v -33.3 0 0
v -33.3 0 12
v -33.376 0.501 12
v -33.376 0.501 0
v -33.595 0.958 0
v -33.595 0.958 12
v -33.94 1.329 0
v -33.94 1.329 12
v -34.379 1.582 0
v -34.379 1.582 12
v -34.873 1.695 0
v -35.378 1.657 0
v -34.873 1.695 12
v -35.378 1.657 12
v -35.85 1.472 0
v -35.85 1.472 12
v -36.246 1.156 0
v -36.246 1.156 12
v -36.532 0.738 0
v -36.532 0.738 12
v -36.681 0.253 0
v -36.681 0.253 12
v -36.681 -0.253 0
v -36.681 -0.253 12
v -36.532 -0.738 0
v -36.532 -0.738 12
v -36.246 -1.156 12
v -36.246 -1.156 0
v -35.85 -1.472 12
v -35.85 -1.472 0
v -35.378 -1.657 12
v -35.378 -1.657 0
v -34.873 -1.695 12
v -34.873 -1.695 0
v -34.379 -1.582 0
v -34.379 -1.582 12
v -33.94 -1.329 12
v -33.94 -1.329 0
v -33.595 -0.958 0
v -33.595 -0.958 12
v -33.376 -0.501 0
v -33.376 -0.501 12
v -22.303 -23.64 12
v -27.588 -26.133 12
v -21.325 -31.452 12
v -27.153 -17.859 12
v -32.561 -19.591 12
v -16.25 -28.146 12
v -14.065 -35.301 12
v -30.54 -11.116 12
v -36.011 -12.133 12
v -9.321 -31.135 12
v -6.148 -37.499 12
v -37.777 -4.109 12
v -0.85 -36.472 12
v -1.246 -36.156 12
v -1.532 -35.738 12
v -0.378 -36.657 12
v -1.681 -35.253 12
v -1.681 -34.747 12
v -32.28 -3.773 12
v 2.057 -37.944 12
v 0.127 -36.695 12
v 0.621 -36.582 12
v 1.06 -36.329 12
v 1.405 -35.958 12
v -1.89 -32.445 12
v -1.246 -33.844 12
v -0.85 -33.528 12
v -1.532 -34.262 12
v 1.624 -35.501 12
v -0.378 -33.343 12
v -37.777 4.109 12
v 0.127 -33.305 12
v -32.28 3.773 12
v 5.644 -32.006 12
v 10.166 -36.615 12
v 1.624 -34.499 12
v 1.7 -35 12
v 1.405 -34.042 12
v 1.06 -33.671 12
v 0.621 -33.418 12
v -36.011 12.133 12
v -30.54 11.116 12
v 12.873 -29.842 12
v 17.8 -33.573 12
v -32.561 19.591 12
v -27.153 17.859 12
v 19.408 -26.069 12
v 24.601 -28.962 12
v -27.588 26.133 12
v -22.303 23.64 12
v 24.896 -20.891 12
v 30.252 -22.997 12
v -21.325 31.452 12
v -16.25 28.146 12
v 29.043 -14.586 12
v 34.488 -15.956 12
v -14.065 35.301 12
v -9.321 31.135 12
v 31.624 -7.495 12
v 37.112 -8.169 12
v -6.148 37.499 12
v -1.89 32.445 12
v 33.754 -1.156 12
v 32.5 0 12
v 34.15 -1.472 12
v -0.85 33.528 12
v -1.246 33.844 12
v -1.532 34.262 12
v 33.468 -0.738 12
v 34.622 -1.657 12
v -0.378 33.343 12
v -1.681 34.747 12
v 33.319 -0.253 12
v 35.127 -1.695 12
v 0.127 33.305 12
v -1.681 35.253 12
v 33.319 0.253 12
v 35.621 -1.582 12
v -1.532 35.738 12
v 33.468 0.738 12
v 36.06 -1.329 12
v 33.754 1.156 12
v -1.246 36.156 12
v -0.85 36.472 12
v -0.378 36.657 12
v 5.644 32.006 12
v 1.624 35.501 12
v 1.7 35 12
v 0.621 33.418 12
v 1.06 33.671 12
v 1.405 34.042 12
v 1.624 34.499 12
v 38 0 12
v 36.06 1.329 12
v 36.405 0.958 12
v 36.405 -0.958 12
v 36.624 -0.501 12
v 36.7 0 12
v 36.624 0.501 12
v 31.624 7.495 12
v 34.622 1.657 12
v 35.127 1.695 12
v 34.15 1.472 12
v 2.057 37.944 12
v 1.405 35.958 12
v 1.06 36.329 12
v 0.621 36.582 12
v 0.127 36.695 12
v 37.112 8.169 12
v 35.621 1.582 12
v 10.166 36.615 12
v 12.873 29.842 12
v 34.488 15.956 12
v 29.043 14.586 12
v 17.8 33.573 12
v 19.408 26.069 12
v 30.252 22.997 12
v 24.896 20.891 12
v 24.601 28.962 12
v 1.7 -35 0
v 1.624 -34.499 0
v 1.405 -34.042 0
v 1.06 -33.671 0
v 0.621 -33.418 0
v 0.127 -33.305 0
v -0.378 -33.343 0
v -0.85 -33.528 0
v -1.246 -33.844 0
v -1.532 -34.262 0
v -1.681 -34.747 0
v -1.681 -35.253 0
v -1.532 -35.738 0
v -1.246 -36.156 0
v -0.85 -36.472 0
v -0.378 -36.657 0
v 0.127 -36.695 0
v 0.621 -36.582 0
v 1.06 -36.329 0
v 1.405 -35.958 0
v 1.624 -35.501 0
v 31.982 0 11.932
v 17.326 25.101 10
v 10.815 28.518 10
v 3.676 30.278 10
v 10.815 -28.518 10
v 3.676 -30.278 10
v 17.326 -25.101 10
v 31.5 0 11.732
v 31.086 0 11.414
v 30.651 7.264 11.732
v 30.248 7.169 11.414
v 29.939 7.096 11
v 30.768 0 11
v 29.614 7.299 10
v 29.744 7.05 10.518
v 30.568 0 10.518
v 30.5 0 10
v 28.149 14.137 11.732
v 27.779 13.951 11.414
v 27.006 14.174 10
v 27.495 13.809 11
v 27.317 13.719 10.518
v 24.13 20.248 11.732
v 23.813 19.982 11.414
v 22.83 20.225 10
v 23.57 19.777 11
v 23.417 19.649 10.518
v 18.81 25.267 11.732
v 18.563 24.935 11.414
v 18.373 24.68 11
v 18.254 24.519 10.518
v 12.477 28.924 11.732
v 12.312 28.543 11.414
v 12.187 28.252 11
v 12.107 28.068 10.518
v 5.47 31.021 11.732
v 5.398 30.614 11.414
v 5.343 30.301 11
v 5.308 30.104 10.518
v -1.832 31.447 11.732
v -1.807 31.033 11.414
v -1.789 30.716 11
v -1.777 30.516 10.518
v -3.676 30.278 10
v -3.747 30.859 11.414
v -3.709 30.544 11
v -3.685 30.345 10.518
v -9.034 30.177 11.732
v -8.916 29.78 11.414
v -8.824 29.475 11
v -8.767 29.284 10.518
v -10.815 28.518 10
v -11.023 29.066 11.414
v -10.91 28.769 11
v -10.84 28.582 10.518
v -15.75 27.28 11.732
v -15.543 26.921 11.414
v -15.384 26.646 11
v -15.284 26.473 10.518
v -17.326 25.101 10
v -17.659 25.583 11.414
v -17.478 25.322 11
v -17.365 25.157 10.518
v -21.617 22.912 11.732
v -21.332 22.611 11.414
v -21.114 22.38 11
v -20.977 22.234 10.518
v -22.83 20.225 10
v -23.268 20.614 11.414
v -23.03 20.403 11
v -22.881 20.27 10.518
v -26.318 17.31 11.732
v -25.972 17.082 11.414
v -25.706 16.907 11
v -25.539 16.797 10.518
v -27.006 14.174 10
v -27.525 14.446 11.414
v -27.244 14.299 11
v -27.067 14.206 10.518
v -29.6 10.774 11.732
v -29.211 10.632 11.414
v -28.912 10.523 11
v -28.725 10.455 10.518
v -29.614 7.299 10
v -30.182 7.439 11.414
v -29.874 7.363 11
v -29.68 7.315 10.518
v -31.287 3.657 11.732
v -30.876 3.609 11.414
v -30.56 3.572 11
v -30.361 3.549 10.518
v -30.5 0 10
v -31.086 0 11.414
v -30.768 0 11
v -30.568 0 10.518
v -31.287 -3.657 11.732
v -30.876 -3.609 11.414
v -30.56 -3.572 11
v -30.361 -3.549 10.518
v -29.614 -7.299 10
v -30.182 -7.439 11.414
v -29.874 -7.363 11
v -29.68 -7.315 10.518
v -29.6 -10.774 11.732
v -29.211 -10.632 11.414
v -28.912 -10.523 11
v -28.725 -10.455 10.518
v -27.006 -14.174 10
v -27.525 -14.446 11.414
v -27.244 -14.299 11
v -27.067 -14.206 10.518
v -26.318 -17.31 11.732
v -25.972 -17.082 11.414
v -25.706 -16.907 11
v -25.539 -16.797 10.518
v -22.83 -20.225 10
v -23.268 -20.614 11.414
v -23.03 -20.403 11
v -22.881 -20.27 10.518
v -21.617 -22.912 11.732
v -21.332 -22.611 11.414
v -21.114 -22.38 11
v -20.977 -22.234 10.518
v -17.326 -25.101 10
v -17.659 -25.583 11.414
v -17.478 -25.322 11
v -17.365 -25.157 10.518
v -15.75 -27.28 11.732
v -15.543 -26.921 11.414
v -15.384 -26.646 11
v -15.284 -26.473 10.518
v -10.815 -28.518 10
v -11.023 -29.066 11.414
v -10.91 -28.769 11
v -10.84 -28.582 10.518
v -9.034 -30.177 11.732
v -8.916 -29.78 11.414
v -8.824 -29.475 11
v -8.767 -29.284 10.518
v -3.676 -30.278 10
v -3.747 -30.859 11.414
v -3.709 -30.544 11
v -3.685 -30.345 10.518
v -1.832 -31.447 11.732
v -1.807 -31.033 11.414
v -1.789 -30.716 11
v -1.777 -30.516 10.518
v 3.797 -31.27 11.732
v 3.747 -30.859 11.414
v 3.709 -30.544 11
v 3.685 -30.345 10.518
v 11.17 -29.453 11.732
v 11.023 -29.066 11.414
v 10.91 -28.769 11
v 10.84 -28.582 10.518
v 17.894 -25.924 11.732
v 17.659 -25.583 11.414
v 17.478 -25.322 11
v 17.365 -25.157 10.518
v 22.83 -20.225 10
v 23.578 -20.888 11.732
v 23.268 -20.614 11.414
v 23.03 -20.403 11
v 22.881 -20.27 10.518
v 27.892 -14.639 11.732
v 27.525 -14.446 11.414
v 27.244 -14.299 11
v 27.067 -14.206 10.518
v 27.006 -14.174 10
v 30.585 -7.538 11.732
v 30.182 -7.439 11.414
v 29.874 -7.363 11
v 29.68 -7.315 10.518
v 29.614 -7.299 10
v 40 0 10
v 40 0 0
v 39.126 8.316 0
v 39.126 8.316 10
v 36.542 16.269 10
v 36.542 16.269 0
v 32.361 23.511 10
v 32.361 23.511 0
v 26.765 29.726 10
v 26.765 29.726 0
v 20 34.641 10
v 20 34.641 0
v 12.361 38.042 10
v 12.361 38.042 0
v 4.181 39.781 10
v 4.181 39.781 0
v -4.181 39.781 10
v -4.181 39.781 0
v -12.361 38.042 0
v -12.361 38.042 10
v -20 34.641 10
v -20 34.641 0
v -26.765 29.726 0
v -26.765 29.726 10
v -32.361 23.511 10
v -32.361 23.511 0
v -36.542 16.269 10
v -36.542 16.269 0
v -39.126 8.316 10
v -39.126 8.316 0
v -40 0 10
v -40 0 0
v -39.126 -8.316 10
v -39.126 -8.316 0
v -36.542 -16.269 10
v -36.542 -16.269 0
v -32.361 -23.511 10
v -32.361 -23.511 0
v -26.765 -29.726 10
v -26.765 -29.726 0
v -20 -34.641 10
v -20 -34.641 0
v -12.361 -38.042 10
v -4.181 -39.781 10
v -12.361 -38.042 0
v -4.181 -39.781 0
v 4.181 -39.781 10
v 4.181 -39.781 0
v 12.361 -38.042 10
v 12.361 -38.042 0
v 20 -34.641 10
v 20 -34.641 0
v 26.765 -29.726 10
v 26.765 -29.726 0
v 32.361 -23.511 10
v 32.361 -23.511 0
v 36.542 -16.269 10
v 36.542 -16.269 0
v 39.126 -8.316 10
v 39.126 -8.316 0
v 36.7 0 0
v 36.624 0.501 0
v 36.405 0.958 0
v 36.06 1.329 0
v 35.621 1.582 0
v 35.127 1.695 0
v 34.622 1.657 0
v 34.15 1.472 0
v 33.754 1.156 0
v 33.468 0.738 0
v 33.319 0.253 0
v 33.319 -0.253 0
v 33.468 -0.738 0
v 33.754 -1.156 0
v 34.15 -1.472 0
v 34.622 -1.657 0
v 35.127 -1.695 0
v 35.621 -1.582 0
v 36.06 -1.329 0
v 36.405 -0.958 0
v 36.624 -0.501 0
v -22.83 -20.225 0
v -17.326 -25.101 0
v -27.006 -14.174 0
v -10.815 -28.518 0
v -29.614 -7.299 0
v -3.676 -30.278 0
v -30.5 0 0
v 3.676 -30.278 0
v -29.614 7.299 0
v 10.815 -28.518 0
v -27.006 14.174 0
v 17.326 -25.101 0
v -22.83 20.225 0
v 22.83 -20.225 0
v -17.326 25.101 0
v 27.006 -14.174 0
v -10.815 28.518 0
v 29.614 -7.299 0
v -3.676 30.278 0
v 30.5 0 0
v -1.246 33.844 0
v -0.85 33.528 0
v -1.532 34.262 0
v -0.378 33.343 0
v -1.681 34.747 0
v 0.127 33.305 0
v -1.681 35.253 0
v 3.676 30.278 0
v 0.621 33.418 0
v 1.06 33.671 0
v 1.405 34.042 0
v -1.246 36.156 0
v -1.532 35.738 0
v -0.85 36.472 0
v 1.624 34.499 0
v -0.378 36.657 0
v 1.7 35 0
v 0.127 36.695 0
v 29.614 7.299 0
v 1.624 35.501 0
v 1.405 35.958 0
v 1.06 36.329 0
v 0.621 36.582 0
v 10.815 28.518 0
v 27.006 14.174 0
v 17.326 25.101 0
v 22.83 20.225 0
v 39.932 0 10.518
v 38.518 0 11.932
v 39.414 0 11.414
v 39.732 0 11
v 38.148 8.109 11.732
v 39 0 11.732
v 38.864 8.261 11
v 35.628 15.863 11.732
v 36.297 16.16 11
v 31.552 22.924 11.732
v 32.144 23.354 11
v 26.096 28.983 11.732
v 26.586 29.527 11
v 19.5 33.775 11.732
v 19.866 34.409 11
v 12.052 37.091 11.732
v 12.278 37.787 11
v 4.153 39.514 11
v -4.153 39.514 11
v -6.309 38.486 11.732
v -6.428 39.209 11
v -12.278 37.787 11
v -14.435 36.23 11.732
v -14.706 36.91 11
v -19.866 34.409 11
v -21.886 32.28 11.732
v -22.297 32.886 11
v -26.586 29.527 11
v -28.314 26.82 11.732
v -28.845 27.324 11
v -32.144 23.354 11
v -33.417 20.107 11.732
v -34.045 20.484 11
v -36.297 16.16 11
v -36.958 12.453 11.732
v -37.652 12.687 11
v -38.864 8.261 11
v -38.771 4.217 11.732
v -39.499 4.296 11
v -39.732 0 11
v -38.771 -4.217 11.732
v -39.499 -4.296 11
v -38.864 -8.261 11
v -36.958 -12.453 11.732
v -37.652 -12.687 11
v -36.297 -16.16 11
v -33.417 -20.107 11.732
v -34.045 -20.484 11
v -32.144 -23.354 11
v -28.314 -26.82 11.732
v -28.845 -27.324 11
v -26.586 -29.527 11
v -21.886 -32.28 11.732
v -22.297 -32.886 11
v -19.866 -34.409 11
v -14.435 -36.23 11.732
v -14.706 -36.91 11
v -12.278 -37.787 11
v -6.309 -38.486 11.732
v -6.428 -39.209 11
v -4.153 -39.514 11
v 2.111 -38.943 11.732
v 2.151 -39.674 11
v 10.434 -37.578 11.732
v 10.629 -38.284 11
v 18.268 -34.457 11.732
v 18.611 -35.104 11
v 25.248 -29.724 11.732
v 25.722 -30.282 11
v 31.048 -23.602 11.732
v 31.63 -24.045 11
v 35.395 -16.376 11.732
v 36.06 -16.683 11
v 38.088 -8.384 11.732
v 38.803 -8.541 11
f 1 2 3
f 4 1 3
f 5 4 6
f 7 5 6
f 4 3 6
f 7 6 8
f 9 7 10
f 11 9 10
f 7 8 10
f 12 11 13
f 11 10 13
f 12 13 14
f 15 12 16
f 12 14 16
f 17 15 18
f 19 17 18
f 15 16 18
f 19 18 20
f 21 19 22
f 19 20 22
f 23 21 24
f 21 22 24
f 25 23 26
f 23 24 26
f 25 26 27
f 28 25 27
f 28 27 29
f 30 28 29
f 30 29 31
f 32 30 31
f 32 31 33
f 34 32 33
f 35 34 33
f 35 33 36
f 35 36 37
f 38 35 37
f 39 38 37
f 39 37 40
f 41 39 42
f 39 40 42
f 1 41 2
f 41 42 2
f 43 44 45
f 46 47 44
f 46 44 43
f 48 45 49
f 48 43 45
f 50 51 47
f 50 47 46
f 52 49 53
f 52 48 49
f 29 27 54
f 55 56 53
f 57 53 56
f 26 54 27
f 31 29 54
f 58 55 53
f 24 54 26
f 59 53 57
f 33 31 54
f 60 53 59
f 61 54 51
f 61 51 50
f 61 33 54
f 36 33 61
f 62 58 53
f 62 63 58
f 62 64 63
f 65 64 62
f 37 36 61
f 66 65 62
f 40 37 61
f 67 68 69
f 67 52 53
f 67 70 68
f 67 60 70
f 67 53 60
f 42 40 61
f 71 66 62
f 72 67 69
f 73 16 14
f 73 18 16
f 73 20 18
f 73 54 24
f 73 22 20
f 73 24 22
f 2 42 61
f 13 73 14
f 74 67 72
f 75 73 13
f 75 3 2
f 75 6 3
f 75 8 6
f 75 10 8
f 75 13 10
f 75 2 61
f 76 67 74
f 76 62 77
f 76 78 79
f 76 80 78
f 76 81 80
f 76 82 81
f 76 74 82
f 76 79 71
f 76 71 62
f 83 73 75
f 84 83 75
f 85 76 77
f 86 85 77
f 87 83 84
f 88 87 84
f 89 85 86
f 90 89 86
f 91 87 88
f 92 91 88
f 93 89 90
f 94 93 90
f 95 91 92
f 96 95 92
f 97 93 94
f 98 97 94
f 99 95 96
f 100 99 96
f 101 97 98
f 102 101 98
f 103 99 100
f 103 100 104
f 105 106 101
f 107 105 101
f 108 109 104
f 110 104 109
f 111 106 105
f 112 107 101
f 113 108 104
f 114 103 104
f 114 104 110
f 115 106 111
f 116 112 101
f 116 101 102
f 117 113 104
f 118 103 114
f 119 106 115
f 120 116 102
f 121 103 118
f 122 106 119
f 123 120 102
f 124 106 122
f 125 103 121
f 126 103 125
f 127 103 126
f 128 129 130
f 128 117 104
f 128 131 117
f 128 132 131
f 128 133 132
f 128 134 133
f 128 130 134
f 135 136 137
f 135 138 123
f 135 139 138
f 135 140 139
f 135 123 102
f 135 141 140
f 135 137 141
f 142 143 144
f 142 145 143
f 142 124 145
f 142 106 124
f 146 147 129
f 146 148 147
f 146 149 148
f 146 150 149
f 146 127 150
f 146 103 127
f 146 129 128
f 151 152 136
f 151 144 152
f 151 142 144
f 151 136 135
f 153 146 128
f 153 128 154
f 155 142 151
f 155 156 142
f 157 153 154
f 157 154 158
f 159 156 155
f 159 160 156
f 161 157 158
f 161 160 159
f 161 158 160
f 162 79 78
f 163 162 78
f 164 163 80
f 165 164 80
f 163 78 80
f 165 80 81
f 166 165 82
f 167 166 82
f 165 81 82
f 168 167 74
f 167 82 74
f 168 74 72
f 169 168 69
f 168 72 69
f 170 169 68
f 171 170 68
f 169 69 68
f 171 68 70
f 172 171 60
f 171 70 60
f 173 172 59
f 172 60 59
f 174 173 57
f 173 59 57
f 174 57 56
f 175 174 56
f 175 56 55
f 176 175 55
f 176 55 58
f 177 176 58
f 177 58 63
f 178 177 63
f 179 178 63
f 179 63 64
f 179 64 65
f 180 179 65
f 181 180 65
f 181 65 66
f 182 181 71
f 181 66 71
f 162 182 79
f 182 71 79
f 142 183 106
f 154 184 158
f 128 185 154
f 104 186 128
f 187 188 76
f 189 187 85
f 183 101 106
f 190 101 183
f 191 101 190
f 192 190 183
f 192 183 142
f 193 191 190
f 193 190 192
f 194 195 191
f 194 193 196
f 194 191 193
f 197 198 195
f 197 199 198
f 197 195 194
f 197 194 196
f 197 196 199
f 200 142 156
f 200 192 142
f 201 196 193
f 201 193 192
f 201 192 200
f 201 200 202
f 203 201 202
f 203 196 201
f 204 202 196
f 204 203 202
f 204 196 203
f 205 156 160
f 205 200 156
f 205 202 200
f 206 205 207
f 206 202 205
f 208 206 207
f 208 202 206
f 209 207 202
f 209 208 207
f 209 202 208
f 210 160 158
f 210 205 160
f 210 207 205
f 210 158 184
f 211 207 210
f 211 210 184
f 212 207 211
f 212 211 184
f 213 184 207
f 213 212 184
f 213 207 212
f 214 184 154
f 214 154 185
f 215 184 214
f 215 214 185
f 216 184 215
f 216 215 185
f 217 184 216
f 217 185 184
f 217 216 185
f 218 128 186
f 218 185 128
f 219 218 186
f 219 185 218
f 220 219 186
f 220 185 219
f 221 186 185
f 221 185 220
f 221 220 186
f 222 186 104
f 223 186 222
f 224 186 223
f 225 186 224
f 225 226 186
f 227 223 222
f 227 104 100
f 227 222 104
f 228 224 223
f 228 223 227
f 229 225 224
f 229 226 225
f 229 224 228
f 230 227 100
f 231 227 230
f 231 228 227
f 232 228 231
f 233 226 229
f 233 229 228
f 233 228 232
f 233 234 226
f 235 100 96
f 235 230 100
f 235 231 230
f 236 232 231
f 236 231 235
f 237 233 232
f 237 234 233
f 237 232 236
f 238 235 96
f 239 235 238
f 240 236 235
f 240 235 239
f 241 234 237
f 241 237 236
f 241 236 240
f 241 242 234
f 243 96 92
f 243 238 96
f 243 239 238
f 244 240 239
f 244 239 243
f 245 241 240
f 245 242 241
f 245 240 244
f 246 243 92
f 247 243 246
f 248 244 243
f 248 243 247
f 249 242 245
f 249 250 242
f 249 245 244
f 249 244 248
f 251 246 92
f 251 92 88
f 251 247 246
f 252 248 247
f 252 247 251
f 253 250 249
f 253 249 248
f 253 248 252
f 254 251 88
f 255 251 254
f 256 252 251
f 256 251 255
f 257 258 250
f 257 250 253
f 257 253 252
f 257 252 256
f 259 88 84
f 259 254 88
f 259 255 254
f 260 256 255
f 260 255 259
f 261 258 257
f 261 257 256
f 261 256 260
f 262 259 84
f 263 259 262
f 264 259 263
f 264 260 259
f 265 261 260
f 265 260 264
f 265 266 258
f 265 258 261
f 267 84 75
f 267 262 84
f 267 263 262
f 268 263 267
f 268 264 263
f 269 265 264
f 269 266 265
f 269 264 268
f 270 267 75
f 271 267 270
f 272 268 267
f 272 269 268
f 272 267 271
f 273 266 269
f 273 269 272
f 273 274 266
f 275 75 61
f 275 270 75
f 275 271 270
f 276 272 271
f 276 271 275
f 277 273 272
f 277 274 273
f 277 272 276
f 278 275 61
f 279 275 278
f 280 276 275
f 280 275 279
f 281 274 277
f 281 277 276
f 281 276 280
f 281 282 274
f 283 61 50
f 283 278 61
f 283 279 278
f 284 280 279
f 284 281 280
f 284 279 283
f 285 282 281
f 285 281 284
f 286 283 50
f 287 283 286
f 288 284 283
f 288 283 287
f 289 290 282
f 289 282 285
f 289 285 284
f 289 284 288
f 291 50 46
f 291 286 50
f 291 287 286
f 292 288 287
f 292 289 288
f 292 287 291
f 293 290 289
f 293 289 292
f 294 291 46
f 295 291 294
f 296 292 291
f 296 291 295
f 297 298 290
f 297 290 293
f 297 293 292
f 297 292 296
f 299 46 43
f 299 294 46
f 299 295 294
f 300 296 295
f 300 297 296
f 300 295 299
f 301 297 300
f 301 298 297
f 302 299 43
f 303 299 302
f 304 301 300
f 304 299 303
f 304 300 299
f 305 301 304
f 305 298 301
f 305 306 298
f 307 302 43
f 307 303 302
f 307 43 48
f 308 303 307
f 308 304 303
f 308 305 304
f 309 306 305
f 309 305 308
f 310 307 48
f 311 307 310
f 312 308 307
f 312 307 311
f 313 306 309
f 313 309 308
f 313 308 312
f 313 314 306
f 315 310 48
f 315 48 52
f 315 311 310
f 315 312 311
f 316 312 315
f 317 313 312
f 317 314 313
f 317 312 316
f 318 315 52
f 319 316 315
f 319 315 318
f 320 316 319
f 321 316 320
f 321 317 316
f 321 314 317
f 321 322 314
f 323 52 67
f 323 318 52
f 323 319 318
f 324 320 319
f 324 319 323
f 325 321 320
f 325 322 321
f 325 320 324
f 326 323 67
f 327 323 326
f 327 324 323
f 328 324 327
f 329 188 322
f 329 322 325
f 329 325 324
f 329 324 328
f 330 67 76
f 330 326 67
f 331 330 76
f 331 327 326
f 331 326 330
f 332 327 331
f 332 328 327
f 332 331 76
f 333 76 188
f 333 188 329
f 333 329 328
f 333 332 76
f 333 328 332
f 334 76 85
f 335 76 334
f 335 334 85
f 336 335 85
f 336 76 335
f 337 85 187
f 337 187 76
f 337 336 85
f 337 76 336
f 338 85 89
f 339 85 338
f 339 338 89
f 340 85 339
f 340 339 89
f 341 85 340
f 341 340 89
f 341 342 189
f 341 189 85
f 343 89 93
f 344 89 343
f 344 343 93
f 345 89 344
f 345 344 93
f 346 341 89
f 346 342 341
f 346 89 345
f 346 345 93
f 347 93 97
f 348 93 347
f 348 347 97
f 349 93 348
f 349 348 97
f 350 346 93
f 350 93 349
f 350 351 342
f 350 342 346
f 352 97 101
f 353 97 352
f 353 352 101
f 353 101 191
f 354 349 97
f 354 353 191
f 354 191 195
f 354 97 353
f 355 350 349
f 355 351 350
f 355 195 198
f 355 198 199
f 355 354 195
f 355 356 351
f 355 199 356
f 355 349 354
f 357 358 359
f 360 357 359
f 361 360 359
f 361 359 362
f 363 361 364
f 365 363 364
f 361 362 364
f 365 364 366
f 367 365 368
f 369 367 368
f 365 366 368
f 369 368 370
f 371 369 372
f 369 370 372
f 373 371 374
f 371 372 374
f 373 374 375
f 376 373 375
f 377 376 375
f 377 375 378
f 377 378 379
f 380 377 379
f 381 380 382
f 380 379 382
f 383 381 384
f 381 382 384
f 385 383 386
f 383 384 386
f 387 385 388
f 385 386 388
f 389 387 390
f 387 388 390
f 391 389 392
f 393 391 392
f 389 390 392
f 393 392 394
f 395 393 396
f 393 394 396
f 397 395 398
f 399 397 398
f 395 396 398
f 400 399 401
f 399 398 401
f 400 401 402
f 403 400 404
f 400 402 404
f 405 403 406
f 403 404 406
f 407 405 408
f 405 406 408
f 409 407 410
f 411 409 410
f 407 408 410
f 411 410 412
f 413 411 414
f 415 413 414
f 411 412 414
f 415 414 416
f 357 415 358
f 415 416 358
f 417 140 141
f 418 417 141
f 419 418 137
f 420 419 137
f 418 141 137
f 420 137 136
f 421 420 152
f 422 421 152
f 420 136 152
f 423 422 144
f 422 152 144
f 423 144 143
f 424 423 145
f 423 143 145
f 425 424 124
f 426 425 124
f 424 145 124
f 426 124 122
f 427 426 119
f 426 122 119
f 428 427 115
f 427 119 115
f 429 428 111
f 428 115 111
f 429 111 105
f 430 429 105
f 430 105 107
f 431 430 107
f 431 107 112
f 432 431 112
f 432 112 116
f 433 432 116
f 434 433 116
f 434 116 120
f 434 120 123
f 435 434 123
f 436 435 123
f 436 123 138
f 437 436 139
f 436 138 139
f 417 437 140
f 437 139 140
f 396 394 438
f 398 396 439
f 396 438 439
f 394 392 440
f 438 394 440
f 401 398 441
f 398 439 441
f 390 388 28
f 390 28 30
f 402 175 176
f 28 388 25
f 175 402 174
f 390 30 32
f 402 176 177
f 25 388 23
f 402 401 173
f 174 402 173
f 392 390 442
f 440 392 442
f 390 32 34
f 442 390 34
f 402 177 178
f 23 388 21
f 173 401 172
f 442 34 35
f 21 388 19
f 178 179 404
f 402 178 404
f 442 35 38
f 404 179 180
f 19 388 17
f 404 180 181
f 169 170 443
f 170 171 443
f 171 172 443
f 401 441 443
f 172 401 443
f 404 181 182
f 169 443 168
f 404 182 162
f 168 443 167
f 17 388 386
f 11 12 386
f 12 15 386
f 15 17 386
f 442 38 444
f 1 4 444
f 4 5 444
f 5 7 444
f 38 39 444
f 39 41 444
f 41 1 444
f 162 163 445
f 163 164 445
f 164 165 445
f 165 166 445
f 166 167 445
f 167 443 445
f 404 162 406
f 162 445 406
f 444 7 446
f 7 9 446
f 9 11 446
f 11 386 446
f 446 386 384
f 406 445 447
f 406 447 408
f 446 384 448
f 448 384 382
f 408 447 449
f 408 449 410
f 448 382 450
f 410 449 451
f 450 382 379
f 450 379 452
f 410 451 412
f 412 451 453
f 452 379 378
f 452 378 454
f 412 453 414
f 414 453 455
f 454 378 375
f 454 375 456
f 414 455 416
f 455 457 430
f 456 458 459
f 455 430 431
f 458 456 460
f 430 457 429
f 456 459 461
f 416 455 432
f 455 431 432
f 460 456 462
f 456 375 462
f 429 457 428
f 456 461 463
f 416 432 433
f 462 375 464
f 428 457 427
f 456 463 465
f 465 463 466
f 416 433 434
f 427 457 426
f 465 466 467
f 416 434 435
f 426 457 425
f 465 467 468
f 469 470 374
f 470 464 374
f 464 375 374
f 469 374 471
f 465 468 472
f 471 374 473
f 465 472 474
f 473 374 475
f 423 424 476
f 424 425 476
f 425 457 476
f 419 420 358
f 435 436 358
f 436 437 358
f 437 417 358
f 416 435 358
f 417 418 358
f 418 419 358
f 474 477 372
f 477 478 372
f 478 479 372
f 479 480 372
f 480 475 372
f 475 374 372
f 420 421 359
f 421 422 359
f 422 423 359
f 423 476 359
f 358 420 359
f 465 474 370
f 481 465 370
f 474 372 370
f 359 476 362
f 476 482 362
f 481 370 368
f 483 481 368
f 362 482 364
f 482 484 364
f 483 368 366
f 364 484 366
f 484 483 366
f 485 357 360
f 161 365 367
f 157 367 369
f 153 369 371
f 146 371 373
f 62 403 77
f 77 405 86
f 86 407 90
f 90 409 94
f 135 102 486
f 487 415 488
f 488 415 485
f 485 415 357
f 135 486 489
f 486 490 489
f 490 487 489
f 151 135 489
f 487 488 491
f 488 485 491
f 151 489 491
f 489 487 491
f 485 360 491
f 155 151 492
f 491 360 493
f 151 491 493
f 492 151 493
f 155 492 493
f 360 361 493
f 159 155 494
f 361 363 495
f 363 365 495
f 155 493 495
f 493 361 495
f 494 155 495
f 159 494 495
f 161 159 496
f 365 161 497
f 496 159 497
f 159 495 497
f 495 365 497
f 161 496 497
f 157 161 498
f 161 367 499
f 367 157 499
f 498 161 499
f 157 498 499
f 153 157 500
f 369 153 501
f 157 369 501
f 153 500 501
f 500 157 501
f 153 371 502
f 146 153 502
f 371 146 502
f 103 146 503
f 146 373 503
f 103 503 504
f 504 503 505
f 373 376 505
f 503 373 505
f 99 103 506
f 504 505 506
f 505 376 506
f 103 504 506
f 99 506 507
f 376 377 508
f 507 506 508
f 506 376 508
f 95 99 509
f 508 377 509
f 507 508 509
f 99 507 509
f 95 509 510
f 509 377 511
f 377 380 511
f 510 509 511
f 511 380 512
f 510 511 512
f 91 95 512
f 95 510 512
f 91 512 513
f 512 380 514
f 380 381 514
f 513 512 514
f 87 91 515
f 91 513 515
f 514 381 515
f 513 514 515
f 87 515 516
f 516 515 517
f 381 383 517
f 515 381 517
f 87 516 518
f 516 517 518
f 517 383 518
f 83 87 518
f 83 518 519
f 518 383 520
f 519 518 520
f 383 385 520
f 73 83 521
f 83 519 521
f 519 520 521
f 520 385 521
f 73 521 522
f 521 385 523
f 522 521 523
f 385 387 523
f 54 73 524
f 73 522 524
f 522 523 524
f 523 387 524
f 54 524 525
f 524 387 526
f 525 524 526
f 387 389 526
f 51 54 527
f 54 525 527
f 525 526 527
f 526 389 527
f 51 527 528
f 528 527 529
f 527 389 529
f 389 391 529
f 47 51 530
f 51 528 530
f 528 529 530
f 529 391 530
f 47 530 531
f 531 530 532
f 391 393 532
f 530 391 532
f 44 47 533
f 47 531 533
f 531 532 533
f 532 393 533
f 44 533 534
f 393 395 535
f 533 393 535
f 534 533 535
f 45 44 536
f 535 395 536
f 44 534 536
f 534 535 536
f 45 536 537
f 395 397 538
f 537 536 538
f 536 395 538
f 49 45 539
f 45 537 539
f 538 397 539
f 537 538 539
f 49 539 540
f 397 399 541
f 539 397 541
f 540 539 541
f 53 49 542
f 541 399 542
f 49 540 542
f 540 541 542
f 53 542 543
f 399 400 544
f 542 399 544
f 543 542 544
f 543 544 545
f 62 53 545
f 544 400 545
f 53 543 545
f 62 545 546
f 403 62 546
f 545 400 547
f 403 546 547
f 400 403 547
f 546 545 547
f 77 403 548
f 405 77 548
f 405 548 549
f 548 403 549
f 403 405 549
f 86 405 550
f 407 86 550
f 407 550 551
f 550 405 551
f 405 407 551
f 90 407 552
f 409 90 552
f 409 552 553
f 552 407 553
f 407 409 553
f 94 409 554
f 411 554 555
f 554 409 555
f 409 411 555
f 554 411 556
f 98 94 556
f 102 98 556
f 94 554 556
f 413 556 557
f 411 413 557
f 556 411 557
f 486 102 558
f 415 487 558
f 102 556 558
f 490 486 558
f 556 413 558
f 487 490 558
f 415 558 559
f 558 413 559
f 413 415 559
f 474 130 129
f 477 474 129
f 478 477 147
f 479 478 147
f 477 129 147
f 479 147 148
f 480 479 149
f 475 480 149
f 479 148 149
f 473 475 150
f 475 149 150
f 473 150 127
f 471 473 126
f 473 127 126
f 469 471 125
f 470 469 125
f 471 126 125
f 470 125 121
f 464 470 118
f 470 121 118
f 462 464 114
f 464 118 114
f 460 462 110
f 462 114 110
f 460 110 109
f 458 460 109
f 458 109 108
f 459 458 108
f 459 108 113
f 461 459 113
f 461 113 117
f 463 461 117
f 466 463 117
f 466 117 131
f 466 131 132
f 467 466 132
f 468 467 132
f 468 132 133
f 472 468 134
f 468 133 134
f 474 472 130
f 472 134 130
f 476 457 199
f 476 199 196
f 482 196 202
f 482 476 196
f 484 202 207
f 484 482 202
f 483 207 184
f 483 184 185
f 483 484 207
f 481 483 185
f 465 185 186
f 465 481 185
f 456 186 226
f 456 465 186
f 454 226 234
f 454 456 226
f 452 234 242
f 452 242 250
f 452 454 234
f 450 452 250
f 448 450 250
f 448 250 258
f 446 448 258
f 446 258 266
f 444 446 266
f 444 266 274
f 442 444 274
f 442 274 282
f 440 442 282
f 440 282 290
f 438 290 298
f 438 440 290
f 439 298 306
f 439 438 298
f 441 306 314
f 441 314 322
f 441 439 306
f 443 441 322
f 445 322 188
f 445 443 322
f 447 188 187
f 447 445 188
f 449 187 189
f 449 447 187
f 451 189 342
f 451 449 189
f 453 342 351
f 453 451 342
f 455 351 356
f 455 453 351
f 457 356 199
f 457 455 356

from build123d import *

# Parameters (mm, degrees)
SKETCH_1_R          = 40
SKETCH_1_R_2        = 30.5
EXTRUDE_1_DEPTH     = 12
SKETCH_2_R          = 1.7
CUT_EXTRUDE_1_DEPTH = 12
FILLET_1_R          = 2
FILLET_2_R          = 2


with BuildPart() as part:
    # 草图1 → 凸台-拉伸1 (new body)
    with BuildSketch(Plane.XY):
        Circle(SKETCH_1_R)
        Circle(SKETCH_1_R_2, mode=Mode.SUBTRACT)
    extrude(amount=EXTRUDE_1_DEPTH)

    # 草图2 → 切除-拉伸1 (cut)
    with BuildSketch(Plane.XY.offset(12)):
        with Locations((35, 0)):
            Circle(SKETCH_2_R)
        with Locations((0, -35)):
            Circle(SKETCH_2_R)
        with Locations((-35, 0)):
            Circle(SKETCH_2_R)
        with Locations((0, 35)):
            Circle(SKETCH_2_R)
    extrude(amount=-CUT_EXTRUDE_1_DEPTH, mode=Mode.SUBTRACT)

    # 圆角1
    fillet_1_edges = [part.edges().sort_by_distance(p)[0] for p in [
        (-30.5, 0, 12),
    ]]
    fillet(fillet_1_edges, radius=FILLET_1_R)

    # 圆角2
    fillet_2_edges = [part.edges().sort_by_distance(p)[0] for p in [
        (-40, 0, 12),
    ]]
    fillet(fillet_2_edges, radius=FILLET_2_R)


solid = part.part
